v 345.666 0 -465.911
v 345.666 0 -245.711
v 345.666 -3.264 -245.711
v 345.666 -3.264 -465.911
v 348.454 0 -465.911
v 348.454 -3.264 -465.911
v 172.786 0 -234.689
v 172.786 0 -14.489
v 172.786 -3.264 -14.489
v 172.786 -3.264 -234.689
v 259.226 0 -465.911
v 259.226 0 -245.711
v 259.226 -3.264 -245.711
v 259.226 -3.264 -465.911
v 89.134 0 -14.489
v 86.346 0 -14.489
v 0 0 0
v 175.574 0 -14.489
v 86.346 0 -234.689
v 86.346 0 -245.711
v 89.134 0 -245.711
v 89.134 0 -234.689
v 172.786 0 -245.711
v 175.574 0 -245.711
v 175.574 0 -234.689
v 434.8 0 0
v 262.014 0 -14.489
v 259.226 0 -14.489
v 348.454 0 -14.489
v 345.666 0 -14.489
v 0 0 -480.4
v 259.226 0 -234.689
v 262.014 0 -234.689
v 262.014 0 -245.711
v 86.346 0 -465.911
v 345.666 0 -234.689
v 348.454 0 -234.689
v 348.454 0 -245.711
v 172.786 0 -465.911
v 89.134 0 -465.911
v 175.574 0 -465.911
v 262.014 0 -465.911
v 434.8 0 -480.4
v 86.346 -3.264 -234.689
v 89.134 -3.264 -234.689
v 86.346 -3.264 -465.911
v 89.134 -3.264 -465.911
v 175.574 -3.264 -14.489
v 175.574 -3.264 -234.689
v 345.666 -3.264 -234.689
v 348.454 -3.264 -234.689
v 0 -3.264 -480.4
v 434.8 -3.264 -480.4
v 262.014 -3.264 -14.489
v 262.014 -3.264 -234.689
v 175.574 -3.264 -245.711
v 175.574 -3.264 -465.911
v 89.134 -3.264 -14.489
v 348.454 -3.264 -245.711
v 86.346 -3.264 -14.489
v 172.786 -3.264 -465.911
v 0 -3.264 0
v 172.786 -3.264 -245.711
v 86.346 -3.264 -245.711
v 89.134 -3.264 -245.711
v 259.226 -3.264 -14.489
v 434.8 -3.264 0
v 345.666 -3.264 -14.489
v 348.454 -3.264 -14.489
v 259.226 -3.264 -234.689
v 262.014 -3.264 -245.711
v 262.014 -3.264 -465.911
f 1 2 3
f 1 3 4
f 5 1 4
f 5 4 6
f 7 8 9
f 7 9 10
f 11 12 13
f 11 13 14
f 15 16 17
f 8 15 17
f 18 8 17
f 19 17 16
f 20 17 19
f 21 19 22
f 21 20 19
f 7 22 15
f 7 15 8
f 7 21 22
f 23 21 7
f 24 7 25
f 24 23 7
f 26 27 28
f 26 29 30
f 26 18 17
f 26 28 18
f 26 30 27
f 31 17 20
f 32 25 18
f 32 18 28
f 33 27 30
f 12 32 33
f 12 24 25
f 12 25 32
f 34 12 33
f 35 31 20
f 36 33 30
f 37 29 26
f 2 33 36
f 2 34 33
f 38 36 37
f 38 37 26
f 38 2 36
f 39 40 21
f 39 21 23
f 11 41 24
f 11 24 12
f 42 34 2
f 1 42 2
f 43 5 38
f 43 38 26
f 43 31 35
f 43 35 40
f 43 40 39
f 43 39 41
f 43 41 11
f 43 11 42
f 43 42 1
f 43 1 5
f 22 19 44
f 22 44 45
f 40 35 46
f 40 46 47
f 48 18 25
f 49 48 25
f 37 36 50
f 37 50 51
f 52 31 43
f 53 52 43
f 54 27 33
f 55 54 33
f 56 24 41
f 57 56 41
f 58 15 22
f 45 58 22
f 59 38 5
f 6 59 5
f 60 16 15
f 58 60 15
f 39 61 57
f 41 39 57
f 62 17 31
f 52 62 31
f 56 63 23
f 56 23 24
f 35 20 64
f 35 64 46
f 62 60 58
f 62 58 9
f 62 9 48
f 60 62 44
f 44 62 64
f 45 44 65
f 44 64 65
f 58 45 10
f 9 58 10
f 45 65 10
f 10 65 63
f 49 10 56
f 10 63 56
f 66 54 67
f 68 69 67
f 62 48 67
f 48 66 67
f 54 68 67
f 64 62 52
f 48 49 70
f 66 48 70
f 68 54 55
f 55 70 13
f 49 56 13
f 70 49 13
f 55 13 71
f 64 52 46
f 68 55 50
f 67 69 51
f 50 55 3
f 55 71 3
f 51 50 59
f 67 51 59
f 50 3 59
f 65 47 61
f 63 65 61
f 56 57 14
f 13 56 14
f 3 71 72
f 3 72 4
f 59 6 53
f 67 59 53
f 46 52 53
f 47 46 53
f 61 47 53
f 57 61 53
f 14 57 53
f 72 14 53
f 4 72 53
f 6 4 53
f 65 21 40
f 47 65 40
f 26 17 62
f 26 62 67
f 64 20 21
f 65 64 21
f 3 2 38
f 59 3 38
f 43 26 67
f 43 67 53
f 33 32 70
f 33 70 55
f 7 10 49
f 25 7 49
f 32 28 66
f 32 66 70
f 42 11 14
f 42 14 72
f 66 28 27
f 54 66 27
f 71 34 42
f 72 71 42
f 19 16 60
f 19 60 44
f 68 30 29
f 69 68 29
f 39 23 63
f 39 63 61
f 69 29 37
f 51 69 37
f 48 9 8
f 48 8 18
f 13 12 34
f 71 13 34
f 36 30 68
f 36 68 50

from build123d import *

# Parameters (mm, degrees)
SKETCH1_W          = 434.8
SKETCH1_H          = 480.4
SKETCH1_W_2        = 2.7888
SKETCH1_H_2        = 220.2
BASE_FLANGE2_DEPTH = 3.264


# Sheet-metal steps are written as plain solids
with BuildPart() as part:
    # Sketch1 → Base-Flange2 (new body)
    with BuildSketch(Plane(origin=(0, 0, 0), x_dir=(1, 0, 0), z_dir=(0, 1, 0))):
        with Locations((217.4, 240.2)):
            Rectangle(SKETCH1_W, SKETCH1_H)
        with Locations((87.74, 355.8112)):
            Rectangle(SKETCH1_W_2, SKETCH1_H_2, mode=Mode.SUBTRACT)
        with Locations((87.74, 124.5888)):
            Rectangle(SKETCH1_W_2, SKETCH1_H_2, mode=Mode.SUBTRACT)
        with Locations((174.18, 355.8112)):
            Rectangle(SKETCH1_W_2, SKETCH1_H_2, mode=Mode.SUBTRACT)
        with Locations((174.18, 124.5888)):
            Rectangle(SKETCH1_W_2, SKETCH1_H_2, mode=Mode.SUBTRACT)
        with Locations((260.62, 355.8112)):
            Rectangle(SKETCH1_W_2, SKETCH1_H_2, mode=Mode.SUBTRACT)
        with Locations((260.62, 124.5888)):
            Rectangle(SKETCH1_W_2, SKETCH1_H_2, mode=Mode.SUBTRACT)
        with Locations((347.06, 355.8112)):
            Rectangle(SKETCH1_W_2, SKETCH1_H_2, mode=Mode.SUBTRACT)
        with Locations((347.06, 124.5888)):
            Rectangle(SKETCH1_W_2, SKETCH1_H_2, mode=Mode.SUBTRACT)
    extrude(amount=-BASE_FLANGE2_DEPTH)


solid = part.part
